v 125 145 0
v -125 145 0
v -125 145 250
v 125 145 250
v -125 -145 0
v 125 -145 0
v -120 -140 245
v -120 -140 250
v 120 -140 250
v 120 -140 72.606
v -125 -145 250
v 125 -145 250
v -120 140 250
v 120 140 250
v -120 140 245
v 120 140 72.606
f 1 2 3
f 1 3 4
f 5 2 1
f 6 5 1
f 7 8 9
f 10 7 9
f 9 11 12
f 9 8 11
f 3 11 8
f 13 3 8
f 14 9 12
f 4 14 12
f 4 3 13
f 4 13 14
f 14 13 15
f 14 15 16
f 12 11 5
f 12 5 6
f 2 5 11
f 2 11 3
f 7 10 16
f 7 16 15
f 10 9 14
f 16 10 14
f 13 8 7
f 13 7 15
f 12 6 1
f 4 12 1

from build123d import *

# Parameters (mm, degrees)
SKETCH_W     = 250
SKETCH_H     = 290
PAD_DEPTH    = 250
SKETCH002_W  = 240
SKETCH002_H  = 280
POCKET_DEPTH = 240
PAD001_DEPTH = 290


with BuildPart() as part:
    # Sketch → Pad (new body)
    with BuildSketch(Plane.XY):
        Rectangle(SKETCH_W, SKETCH_H)
    extrude(amount=PAD_DEPTH)

    # Sketch002 (on Face6 of Pad) → Pocket (cut)
    with BuildSketch(Plane.XY.offset(250)):
        Rectangle(SKETCH002_W, SKETCH002_H)
    extrude(amount=-POCKET_DEPTH, mode=Mode.SUBTRACT)

    # Sketch003 (on Face1 of Pocket) → Pad001 (join)
    with BuildSketch(Plane.XZ.offset(145)):
        Polygon((-120, 245), (-120, 5), (120, 5), (120, 72.606014), align=None)
    extrude(amount=-PAD001_DEPTH)


solid = part.part
